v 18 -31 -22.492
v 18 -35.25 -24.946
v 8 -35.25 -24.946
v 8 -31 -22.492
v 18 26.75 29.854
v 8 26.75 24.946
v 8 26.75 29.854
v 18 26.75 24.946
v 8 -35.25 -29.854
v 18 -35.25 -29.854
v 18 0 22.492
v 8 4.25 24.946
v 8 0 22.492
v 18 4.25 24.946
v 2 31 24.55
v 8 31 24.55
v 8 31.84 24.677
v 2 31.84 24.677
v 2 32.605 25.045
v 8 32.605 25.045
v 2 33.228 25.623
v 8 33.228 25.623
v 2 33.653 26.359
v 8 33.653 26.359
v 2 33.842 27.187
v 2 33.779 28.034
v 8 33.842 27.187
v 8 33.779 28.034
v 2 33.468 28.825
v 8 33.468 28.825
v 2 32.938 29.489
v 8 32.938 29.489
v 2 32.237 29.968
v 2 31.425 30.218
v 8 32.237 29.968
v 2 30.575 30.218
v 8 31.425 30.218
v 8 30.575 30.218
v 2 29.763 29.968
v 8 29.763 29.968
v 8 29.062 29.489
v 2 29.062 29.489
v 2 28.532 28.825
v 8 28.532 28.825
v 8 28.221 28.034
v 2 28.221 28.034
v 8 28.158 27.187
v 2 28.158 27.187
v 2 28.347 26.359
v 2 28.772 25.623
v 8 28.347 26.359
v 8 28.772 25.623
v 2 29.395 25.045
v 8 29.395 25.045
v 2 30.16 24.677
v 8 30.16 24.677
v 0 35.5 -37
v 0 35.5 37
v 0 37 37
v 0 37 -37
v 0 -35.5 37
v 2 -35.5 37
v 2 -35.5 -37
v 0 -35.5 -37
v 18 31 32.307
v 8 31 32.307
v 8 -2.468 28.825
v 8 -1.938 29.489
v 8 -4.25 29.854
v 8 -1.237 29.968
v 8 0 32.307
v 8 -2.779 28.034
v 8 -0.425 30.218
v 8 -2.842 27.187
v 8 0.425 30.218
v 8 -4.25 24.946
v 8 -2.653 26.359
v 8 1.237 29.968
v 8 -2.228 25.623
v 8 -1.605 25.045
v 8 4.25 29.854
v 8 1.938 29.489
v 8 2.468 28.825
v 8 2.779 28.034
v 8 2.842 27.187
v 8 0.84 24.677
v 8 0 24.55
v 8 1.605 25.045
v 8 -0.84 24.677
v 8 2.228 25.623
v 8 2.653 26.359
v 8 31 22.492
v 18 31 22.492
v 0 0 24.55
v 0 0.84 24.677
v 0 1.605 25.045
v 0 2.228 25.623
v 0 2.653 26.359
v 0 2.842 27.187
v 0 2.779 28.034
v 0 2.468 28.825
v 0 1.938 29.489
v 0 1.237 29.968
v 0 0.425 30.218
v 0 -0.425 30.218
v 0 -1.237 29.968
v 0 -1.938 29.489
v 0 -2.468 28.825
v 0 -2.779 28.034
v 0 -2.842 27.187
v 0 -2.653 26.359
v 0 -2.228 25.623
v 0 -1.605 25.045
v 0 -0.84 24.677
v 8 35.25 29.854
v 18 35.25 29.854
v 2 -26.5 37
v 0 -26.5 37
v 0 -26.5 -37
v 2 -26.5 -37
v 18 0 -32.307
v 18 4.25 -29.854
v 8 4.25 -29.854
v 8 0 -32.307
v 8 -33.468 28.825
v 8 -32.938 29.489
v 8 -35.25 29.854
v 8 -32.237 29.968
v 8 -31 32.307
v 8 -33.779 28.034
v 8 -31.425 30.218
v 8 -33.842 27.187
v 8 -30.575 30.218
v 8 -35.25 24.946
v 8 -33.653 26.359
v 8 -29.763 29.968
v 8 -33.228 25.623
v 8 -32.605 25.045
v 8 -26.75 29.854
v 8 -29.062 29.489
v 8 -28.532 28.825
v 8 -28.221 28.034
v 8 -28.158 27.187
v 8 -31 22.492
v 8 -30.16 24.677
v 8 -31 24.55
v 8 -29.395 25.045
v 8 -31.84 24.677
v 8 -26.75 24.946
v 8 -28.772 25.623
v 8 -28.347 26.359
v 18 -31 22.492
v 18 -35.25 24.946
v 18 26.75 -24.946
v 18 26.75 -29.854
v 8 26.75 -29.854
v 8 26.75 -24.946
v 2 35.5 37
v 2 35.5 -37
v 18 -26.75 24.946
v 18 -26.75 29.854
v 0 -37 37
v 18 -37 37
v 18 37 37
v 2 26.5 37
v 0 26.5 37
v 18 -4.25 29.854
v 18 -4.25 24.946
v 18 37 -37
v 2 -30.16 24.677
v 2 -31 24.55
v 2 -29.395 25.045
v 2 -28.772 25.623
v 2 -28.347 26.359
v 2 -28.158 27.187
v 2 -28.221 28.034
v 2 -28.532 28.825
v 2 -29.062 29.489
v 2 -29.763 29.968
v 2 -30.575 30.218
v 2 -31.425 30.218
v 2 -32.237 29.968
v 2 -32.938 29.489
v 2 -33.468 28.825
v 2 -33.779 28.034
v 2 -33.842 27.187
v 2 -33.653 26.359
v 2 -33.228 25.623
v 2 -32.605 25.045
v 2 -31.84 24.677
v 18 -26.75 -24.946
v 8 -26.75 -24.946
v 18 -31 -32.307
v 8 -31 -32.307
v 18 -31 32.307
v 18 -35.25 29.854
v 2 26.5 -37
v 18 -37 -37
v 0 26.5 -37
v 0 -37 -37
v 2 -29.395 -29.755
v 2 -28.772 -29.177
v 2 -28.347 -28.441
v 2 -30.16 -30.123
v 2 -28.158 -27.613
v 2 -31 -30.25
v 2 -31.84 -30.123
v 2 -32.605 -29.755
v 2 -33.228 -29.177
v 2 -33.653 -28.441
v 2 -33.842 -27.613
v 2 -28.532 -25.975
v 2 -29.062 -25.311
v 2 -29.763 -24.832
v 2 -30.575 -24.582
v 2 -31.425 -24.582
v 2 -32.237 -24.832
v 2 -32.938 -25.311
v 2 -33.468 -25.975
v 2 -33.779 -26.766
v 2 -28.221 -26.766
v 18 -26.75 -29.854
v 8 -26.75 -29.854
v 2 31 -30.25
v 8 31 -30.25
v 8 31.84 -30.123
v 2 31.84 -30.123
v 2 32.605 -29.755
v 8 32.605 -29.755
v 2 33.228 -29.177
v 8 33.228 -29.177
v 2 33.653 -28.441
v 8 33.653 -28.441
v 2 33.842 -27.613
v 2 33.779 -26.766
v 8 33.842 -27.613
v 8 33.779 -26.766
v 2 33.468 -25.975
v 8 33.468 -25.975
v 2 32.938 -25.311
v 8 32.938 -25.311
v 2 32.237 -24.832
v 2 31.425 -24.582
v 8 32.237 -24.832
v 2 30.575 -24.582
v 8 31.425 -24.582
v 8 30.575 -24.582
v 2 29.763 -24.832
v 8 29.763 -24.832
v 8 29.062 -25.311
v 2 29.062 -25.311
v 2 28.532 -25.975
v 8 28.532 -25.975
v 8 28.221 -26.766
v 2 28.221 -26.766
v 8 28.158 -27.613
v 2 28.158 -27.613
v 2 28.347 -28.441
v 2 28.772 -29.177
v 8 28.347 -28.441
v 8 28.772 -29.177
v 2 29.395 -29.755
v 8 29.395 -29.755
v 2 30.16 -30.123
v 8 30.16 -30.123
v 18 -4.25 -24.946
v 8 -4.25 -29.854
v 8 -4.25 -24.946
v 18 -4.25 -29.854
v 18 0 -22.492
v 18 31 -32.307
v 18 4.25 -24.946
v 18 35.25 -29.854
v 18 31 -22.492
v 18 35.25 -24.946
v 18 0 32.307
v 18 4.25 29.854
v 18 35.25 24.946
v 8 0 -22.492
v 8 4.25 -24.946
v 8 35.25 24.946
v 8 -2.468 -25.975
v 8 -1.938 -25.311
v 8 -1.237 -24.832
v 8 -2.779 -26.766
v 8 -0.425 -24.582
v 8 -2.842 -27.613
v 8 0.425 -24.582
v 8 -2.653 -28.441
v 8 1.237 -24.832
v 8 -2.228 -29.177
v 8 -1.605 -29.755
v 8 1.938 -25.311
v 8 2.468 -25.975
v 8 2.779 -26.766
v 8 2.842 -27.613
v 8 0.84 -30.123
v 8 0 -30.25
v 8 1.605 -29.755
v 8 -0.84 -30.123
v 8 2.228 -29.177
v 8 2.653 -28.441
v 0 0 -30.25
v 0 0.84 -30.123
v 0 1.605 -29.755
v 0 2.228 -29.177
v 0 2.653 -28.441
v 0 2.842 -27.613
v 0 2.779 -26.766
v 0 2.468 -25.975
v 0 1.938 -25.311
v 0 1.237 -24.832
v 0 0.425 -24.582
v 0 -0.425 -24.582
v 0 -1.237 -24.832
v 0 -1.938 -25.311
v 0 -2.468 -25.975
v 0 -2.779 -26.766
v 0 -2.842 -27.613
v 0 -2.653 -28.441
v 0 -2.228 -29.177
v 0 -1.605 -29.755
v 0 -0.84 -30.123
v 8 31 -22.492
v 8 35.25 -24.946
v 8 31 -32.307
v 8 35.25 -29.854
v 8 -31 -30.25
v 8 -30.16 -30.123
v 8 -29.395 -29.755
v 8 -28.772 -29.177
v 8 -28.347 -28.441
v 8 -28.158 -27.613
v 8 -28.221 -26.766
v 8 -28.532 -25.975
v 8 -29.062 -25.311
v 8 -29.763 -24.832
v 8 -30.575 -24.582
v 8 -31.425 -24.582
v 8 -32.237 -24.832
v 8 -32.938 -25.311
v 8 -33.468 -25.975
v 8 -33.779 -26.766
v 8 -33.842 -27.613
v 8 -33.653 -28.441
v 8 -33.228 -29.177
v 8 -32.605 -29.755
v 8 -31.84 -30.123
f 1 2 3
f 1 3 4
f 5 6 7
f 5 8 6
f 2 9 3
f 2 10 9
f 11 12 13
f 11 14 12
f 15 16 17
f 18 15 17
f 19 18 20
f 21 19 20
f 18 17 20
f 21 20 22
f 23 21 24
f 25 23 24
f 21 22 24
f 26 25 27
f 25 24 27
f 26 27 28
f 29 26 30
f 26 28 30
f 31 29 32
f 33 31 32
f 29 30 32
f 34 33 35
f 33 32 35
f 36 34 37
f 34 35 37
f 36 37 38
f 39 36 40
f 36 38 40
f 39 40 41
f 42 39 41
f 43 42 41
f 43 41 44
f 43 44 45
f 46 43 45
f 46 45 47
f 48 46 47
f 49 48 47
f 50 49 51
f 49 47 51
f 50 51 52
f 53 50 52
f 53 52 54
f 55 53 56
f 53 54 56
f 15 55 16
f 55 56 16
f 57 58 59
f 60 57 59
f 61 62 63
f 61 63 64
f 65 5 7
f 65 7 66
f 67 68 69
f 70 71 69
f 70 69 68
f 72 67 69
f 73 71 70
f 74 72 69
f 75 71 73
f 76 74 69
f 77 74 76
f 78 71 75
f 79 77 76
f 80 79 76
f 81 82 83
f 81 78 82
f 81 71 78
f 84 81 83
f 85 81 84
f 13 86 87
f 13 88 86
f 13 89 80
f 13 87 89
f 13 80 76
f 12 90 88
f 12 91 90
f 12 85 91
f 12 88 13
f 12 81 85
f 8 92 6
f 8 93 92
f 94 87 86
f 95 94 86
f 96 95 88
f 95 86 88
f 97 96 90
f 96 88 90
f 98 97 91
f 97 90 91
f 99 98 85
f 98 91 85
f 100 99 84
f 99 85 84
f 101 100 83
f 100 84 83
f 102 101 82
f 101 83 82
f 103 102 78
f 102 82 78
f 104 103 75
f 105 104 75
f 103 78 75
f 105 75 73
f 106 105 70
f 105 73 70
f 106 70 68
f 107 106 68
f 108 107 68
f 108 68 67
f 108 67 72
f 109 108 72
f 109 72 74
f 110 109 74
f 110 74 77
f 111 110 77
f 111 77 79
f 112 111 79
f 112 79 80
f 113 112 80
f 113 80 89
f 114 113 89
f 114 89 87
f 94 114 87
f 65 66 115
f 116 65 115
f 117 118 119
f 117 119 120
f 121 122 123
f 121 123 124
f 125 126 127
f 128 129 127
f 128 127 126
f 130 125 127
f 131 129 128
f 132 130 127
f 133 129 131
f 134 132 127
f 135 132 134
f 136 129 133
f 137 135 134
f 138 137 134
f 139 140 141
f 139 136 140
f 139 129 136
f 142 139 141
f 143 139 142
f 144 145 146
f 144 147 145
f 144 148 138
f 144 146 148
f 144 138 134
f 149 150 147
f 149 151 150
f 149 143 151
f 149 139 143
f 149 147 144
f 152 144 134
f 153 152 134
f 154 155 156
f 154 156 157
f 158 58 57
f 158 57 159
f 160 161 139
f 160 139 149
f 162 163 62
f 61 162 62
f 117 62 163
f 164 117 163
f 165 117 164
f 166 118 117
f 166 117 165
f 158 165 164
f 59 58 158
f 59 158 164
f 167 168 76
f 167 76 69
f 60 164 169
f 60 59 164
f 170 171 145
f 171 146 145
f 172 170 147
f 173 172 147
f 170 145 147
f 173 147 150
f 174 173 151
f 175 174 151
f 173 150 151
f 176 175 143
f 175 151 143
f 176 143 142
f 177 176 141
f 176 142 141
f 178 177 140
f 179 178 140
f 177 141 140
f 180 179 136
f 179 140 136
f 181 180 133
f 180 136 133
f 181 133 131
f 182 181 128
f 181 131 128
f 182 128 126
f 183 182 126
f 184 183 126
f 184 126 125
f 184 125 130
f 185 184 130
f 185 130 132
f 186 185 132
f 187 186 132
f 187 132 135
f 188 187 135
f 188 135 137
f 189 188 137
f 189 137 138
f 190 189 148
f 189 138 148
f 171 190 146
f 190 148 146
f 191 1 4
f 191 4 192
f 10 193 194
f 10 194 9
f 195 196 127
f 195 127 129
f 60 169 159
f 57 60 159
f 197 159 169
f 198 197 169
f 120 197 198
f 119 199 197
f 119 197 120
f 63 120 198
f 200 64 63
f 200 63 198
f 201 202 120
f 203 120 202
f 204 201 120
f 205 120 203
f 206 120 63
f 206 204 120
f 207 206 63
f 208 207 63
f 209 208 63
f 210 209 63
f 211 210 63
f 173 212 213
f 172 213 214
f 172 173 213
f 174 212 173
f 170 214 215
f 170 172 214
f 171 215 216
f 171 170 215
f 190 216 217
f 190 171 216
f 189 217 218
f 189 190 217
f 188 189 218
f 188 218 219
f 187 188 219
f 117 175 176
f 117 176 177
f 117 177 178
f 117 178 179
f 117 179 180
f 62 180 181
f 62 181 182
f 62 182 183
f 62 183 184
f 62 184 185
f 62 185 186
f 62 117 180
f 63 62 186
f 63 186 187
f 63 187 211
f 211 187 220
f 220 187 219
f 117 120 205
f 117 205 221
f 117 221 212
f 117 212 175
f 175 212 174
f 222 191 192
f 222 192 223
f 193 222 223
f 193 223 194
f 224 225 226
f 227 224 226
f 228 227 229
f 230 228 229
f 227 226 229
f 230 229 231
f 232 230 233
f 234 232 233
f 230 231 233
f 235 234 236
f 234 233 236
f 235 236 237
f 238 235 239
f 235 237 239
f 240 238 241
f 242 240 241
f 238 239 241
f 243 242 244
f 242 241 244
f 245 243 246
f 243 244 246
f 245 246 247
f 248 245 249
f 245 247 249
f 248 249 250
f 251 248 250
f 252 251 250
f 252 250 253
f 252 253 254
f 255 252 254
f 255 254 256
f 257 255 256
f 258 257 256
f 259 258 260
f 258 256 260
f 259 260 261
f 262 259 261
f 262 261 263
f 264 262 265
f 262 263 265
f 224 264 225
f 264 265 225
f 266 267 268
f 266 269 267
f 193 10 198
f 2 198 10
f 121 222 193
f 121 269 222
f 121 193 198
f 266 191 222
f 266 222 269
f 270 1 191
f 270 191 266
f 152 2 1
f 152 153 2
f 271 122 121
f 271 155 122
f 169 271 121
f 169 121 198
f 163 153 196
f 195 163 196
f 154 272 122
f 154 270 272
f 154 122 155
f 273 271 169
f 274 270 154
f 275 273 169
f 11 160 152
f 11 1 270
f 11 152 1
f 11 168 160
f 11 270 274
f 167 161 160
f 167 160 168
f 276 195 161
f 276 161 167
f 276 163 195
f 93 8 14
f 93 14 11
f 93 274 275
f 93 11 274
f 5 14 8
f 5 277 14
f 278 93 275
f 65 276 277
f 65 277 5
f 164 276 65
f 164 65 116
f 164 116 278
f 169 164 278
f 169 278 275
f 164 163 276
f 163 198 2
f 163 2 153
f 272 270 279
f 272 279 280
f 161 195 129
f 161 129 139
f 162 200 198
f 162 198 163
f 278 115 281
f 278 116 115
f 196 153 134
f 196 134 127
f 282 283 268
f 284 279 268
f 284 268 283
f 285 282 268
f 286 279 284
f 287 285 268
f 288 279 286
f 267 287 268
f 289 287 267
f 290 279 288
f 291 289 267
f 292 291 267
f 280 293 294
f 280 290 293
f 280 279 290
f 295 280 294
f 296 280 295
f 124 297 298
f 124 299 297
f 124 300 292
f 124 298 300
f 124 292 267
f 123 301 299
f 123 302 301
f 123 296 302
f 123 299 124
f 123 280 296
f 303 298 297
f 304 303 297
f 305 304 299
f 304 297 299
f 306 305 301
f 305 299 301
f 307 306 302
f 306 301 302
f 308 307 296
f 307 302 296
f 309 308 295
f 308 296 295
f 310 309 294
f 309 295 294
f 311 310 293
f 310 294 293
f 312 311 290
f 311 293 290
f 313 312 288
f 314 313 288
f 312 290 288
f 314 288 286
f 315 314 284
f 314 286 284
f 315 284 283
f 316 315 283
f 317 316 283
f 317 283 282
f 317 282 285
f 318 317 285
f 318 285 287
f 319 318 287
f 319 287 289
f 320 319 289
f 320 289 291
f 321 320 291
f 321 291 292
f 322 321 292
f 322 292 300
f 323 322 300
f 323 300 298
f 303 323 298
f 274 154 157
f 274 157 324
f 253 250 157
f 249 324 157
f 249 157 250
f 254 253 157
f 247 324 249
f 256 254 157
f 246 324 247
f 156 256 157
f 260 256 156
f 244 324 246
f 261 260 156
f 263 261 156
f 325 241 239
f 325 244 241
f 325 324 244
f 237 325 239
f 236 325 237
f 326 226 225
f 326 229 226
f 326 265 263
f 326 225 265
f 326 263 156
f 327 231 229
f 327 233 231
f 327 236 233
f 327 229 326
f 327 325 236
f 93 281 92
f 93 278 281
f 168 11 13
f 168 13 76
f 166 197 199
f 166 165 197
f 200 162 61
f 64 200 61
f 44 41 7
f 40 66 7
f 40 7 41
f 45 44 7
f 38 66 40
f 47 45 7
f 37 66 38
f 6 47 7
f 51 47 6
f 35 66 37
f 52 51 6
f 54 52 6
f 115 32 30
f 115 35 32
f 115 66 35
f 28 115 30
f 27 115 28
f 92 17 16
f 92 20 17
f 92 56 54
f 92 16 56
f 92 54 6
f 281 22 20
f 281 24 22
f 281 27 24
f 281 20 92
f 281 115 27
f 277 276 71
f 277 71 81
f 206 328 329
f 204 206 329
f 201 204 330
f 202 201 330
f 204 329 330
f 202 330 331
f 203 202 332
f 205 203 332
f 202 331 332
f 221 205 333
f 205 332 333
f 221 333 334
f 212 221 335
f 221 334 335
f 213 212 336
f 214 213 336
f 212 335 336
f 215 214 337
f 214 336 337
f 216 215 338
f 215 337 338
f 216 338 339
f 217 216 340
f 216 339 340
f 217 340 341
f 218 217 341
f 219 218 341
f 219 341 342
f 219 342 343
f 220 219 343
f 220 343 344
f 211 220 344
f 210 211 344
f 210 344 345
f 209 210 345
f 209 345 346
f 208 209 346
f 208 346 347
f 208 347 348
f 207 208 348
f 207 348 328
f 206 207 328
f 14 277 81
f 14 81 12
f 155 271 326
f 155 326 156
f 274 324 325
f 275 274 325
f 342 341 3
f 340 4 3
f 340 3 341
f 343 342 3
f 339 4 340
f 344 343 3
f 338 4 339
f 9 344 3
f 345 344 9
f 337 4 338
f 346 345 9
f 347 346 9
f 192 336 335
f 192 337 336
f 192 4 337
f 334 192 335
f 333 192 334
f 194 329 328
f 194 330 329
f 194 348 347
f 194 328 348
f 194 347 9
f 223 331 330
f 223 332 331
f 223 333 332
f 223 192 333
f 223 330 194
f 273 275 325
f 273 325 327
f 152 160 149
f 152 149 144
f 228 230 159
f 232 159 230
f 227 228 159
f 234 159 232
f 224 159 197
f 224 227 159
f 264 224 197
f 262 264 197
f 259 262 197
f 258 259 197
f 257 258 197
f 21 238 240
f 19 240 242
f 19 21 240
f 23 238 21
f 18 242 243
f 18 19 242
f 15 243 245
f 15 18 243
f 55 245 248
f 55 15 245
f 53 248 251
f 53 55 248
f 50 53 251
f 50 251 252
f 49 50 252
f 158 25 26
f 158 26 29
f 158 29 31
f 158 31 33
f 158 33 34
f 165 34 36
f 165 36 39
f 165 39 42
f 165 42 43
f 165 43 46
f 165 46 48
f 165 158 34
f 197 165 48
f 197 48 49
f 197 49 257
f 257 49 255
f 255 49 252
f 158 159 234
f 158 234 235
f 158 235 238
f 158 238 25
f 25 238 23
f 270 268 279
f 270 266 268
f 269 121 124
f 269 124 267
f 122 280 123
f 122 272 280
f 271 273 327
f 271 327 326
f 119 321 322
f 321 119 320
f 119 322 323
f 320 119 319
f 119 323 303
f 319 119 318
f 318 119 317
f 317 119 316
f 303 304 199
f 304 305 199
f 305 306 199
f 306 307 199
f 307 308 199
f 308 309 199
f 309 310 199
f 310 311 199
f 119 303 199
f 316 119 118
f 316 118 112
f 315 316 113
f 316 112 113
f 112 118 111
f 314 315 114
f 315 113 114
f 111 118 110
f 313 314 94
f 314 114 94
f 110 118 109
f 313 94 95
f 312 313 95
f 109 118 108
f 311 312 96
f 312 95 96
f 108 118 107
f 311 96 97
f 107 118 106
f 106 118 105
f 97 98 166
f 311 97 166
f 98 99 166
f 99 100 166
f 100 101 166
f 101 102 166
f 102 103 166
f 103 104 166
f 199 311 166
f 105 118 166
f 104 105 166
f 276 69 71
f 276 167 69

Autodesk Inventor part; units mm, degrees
ref_plane "YZ Plane" through (0, 0, 0) normal (1, 0, 0) x (0, 1, 0)
ref_plane "XZ Plane" through (0, 0, 0) normal (0, 1, 0) x (-1, 0, 0)
ref_plane "XY Plane" through (0, 0, 0) normal (0, 0, 1) x (1, 0, 0)
sketch "Szkic1" plane through (0, 0, 0) normal (1, 0, 0) x (0, 1, 0)
  line L0 (-37, 37) -> (37, 37)
  line L1 (37, 37) -> (37, -37)
  line L2 (37, -37) -> (-37, -37)
  line L3 (-37, -37) -> (-37, 37)
  line L4 (-37, 37) -> (37, -37) construction
  line L5 (37, 37) -> (-37, -37) construction
  point P0 (0, 0)
  dimension "d0" = 74
  dimension "d1" = 74
extrude "Wyciągnięcie proste1" add sketch "Szkic1" along normal blind 18
sketch "Szkic2" plane through (18, 0, 0) normal (1, 0, 0) x (0, 0, -1)
  circle A0 centre (-27.4, 31) radius 2.85
  line L0 (37, 37) -> (-37, 37) projected
  line L1 (-37, 37) -> (-37, -37) projected
  circle A1 centre (-27.4, 0) radius 2.85
  circle A2 centre (-27.4, -31) radius 2.85
  circle A3 centre (27.4, 31) radius 2.85
  line L2 (37, -37) -> (37, 37) projected
  circle A4 centre (27.4, 0) radius 2.85
  circle A5 centre (27.4, -31) radius 2.85
  line L3 (-29.8537, 35.25) -> (-24.9463, 35.25)
  line L4 (-24.9463, 35.25) -> (-22.4925, 31)
  line L5 (-22.4925, 31) -> (-24.9463, 26.75)
  line L6 (-24.9463, 26.75) -> (-29.8537, 26.75)
  line L7 (-29.8537, 26.75) -> (-32.3075, 31)
  line L8 (-32.3075, 31) -> (-29.8537, 35.25)
  line L9 (-29.8537, 4.25) -> (-24.9463, 4.25)
  line L10 (-24.9463, 4.25) -> (-22.4925, 0)
  line L11 (-22.4925, 0) -> (-24.9463, -4.25)
  line L12 (-24.9463, -4.25) -> (-29.8537, -4.25)
  line L13 (-29.8537, -4.25) -> (-32.3075, 0)
  line L14 (-32.3075, 0) -> (-29.8537, 4.25)
  line L15 (-29.8537, -26.75) -> (-24.9463, -26.75)
  line L16 (-24.9463, -26.75) -> (-22.4925, -31)
  line L17 (-22.4925, -31) -> (-24.9463, -35.25)
  line L18 (-24.9463, -35.25) -> (-29.8537, -35.25)
  line L19 (-29.8537, -35.25) -> (-32.3075, -31)
  line L20 (-32.3075, -31) -> (-29.8537, -26.75)
  line L21 (29.8537, 35.25) -> (32.3075, 31)
  line L22 (32.3075, 31) -> (29.8537, 26.75)
  line L23 (29.8537, 26.75) -> (24.9463, 26.75)
  line L24 (24.9463, 26.75) -> (22.4925, 31)
  line L25 (22.4925, 31) -> (24.9463, 35.25)
  line L26 (24.9463, 35.25) -> (29.8537, 35.25)
  line L27 (29.8537, 4.25) -> (32.3075, 0)
  line L28 (32.3075, 0) -> (29.8537, -4.25)
  line L29 (29.8537, -4.25) -> (24.9463, -4.25)
  line L30 (24.9463, -4.25) -> (22.4925, 0)
  line L31 (22.4925, 0) -> (24.9463, 4.25)
  line L32 (24.9463, 4.25) -> (29.8537, 4.25)
  line L33 (29.8537, -26.75) -> (32.3075, -31)
  line L34 (32.3075, -31) -> (29.8537, -35.25)
  line L35 (29.8537, -35.25) -> (24.9463, -35.25)
  line L36 (24.9463, -35.25) -> (22.4925, -31)
  line L37 (22.4925, -31) -> (24.9463, -26.75)
  line L38 (24.9463, -26.75) -> (29.8537, -26.75)
  point P0 (0, 0)
  point P1 (27.4, -26.75)
  dimension "d4" = 6
  dimension "d5" = 5.7
  dimension "d6" = 9.6
  dimension "d7" = 31
  dimension "d8" = 31
  dimension "d9" = 5.7
  dimension "d10" = 5.7
  dimension "d11" = 9.6
  dimension "d12" = 5.7
  dimension "d13" = 5.7
  dimension "d14" = 5.7
  dimension "d15" = 8.5
  dimension "d16" = 8.5
  dimension "d17" = 8.5
  dimension "d18" = 8.5
  dimension "d19" = 8.5
  dimension "d20" = 8.5
extrude "Wyciągnięcie proste2" cut sketch "Szkic2" against normal through all contours A0 | A1 | A2 | A3 | A4 | A5
extrude "Wyciągnięcie proste3" cut sketch "Szkic2" against normal blind 10 contours A0 | A1 | A2 | A3 | A4 | A5 | L3 L4 L5 L6 L7 L8 | L9 L10 L11 L12 L13 L14 | L15 L16 L17 L18 L19 L20 | L21 L22 L23 L24 L25 L26 | L27 L28 L29 L30 L31 L32 | L33 L34 L35 L36 L37 L38
sketch "Szkic3" plane through (0, -37, 37) normal (0, 0, 1) x (1, 0, 0)
  line L0 (0, 0) -> (0, 74) projected
  line L1 (0, 72.5) -> (2, 72.5)
  line L2 (2, 72.5) -> (2, 63.5)
  line L3 (2, 63.5) -> (0, 63.5)
  line L4 (0, 63.5) -> (0, 72.5)
  line L5 (0, 74) -> (18, 74) projected
  line L6 (0, 10.5) -> (2, 10.5)
  line L7 (2, 10.5) -> (2, 1.5)
  line L8 (2, 1.5) -> (0, 1.5)
  line L9 (0, 1.5) -> (0, 10.5)
  point P0 (0, 37)
  point P1 (0, 1.5)
  point P2 (0, 63.5)
  dimension "d25" = 1.5
  dimension "d26" = 9
  dimension "d27" = 2
  dimension "d28" = 2
  dimension "d29" = 9
  dimension "d30" = 1.5
extrude "Wyciągnięcie proste4" cut sketch "Szkic3" against normal through all
properties part number "Y_end_cover" material "Tworzywo sztuczne ABS"
